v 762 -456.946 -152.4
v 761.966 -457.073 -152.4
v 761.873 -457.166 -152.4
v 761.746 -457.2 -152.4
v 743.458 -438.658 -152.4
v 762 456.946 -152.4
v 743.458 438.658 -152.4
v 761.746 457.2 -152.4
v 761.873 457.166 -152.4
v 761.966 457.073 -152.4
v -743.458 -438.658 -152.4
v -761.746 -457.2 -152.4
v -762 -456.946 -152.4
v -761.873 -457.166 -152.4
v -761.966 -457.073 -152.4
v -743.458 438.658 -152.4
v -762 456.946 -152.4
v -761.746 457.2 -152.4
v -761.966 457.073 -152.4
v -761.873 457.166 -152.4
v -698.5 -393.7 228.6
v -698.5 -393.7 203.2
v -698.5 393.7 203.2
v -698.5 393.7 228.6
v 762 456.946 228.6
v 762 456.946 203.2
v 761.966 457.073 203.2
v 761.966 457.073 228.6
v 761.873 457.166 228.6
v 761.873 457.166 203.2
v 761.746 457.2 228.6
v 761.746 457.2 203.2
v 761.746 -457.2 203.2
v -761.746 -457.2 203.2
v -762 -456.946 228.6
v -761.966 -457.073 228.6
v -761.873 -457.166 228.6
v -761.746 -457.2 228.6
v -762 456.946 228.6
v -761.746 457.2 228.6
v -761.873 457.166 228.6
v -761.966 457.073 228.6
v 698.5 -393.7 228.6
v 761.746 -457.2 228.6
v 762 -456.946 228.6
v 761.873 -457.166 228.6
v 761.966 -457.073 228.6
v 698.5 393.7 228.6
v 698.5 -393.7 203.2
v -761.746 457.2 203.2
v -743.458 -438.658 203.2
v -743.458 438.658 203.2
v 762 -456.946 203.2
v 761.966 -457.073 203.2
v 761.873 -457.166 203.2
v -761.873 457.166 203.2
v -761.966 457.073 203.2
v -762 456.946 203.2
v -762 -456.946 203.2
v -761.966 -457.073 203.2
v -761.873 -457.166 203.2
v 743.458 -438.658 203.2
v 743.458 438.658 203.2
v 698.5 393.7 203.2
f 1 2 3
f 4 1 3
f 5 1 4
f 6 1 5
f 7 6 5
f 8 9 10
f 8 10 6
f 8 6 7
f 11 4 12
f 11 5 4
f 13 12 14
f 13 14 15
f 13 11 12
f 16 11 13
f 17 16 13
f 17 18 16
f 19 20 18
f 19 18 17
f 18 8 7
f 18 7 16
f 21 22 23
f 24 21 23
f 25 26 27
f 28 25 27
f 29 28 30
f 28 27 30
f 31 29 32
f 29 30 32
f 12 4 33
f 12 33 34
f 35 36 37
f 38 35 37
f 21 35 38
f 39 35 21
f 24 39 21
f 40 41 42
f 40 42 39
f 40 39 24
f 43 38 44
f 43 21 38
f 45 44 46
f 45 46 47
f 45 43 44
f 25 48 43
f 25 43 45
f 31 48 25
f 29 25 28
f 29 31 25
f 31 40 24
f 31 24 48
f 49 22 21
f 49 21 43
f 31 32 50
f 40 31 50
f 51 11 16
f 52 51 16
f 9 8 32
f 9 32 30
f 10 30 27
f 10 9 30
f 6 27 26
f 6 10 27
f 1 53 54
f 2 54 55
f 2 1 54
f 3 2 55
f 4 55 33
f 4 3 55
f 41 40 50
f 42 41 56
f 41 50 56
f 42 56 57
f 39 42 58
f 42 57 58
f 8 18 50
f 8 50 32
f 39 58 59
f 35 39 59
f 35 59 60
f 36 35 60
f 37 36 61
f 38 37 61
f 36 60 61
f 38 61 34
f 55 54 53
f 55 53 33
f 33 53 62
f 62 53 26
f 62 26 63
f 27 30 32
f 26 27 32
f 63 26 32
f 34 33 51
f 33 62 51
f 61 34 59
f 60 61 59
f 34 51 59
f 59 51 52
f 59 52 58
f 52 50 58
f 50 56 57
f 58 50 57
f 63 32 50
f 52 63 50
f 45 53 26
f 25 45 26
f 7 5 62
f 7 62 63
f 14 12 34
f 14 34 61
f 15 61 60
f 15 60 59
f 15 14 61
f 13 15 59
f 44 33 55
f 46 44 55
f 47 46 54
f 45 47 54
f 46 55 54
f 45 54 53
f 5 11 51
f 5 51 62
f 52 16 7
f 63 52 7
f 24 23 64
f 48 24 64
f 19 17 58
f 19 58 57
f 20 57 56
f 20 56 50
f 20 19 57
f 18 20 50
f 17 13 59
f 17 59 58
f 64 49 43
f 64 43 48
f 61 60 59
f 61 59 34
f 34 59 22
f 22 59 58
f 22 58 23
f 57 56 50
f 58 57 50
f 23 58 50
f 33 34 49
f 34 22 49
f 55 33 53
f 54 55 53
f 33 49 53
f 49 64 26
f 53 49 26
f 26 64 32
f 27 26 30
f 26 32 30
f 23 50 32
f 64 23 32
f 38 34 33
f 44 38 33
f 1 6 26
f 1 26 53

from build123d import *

# Parameters (mm, degrees)
EXTRUDE_THIN1_DEPTH      = 203.2
EXTRUDE_THIN1_DEPTH_BACK = 152.4
SKETCH1_W                = 1486.916
SKETCH1_H                = 877.316
SKETCH2_W                = 1397
SKETCH2_H                = 787.4
EXTRUDE_THIN2_DEPTH      = 25.4


with BuildPart() as part:
    # Sketch1 → Extrude-Thin1 (new, two sides: drawn at the far end of the back side and taken through both)
    with BuildSketch(Plane.XY.offset(-EXTRUDE_THIN1_DEPTH_BACK)):
        with BuildLine():
            Line((-761.746, 457.2), (761.746, 457.2))
            ThreePointArc((761.746, 457.2), (761.925605122, 457.125605122), (762, 456.946))
            Line((762, 456.946), (762, -456.946))
            ThreePointArc((762, -456.946), (761.925605123, -457.125605122), (761.746, -457.2))
            Line((761.746, -457.2), (-761.746, -457.2))
            ThreePointArc((-761.746, -457.2), (-761.925605123, -457.125605123), (-762, -456.946))
            Line((-762, -456.946), (-762, 456.946))
            ThreePointArc((-762, 456.946), (-761.925605123, 457.125605123), (-761.746, 457.2))
        make_face()
        Rectangle(SKETCH1_W, SKETCH1_H, mode=Mode.SUBTRACT)
    extrude(amount=EXTRUDE_THIN1_DEPTH + EXTRUDE_THIN1_DEPTH_BACK)


with BuildPart() as body_2:
    # Sketch2 → Extrude-Thin2 (new body)
    with BuildSketch(Plane.XY.offset(203.2)):
        with BuildLine():
            Line((-762, 456.946), (-762, -456.946))
            ThreePointArc((-762, -456.946), (-761.925605123, -457.125605122), (-761.746, -457.2))
            Line((-761.746, -457.2), (761.746, -457.2))
            ThreePointArc((761.746, -457.2), (761.925605123, -457.125605122), (762, -456.946))
            Line((762, -456.946), (762, 456.946))
            ThreePointArc((762, 456.946), (761.925605122, 457.125605122), (761.746, 457.2))
            Line((761.746, 457.2), (-761.746, 457.2))
            ThreePointArc((-761.746, 457.2), (-761.925605123, 457.125605123), (-762, 456.946))
        make_face()
        Rectangle(SKETCH2_W, SKETCH2_H, mode=Mode.SUBTRACT)
    extrude(amount=EXTRUDE_THIN2_DEPTH)


solid = Compound([part.part, body_2.part])
